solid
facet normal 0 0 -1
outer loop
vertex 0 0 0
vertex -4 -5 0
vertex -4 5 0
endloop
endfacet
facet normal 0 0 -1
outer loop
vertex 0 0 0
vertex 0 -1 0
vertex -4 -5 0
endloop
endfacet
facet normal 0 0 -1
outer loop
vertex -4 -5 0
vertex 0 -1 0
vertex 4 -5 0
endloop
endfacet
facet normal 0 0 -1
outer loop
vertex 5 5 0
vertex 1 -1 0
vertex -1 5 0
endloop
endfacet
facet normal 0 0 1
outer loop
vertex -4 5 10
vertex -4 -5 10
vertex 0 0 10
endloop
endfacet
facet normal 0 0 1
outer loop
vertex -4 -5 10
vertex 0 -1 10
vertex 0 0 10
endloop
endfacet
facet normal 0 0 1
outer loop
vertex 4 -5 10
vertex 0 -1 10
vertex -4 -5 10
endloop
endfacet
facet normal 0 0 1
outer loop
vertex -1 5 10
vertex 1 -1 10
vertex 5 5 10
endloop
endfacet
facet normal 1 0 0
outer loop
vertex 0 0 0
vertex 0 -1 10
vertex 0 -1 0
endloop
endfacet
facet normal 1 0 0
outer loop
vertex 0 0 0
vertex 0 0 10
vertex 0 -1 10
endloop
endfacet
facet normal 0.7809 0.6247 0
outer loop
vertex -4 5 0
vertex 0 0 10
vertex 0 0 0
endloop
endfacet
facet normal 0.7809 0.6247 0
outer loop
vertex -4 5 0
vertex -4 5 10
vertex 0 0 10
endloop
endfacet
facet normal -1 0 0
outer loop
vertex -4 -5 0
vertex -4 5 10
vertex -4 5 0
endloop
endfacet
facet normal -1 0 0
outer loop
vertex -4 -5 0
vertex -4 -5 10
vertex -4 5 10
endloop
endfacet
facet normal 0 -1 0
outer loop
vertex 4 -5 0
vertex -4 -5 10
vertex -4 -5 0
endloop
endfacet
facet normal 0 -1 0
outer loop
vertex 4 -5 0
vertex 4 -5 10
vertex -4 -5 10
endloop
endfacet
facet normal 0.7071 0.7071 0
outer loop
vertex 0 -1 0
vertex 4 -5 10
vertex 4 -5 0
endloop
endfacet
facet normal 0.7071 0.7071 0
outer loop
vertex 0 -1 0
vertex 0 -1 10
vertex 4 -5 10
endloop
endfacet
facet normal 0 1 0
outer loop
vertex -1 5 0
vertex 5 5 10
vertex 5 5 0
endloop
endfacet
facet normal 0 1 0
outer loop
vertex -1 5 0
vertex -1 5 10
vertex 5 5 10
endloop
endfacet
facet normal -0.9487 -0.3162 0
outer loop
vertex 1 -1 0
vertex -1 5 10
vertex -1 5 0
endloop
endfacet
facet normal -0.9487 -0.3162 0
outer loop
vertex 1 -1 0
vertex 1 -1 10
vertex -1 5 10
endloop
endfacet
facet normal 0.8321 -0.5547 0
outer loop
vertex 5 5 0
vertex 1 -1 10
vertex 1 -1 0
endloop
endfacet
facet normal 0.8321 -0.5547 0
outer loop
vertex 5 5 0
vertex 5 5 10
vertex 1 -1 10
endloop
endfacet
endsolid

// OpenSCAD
/* use with -gran=1 */
linear_extrude(height = 10) {
    polygon(
        points=[
            [ 0, 0],
            [ 0, -1],
            [ 4, -5],
            [-4, -5],
            [-4, +5],
        ]
    );
    polygon(
        points=[
            [-1, +5],
            [+1, -1],
            [+5, +5]
        ]
    );
}
